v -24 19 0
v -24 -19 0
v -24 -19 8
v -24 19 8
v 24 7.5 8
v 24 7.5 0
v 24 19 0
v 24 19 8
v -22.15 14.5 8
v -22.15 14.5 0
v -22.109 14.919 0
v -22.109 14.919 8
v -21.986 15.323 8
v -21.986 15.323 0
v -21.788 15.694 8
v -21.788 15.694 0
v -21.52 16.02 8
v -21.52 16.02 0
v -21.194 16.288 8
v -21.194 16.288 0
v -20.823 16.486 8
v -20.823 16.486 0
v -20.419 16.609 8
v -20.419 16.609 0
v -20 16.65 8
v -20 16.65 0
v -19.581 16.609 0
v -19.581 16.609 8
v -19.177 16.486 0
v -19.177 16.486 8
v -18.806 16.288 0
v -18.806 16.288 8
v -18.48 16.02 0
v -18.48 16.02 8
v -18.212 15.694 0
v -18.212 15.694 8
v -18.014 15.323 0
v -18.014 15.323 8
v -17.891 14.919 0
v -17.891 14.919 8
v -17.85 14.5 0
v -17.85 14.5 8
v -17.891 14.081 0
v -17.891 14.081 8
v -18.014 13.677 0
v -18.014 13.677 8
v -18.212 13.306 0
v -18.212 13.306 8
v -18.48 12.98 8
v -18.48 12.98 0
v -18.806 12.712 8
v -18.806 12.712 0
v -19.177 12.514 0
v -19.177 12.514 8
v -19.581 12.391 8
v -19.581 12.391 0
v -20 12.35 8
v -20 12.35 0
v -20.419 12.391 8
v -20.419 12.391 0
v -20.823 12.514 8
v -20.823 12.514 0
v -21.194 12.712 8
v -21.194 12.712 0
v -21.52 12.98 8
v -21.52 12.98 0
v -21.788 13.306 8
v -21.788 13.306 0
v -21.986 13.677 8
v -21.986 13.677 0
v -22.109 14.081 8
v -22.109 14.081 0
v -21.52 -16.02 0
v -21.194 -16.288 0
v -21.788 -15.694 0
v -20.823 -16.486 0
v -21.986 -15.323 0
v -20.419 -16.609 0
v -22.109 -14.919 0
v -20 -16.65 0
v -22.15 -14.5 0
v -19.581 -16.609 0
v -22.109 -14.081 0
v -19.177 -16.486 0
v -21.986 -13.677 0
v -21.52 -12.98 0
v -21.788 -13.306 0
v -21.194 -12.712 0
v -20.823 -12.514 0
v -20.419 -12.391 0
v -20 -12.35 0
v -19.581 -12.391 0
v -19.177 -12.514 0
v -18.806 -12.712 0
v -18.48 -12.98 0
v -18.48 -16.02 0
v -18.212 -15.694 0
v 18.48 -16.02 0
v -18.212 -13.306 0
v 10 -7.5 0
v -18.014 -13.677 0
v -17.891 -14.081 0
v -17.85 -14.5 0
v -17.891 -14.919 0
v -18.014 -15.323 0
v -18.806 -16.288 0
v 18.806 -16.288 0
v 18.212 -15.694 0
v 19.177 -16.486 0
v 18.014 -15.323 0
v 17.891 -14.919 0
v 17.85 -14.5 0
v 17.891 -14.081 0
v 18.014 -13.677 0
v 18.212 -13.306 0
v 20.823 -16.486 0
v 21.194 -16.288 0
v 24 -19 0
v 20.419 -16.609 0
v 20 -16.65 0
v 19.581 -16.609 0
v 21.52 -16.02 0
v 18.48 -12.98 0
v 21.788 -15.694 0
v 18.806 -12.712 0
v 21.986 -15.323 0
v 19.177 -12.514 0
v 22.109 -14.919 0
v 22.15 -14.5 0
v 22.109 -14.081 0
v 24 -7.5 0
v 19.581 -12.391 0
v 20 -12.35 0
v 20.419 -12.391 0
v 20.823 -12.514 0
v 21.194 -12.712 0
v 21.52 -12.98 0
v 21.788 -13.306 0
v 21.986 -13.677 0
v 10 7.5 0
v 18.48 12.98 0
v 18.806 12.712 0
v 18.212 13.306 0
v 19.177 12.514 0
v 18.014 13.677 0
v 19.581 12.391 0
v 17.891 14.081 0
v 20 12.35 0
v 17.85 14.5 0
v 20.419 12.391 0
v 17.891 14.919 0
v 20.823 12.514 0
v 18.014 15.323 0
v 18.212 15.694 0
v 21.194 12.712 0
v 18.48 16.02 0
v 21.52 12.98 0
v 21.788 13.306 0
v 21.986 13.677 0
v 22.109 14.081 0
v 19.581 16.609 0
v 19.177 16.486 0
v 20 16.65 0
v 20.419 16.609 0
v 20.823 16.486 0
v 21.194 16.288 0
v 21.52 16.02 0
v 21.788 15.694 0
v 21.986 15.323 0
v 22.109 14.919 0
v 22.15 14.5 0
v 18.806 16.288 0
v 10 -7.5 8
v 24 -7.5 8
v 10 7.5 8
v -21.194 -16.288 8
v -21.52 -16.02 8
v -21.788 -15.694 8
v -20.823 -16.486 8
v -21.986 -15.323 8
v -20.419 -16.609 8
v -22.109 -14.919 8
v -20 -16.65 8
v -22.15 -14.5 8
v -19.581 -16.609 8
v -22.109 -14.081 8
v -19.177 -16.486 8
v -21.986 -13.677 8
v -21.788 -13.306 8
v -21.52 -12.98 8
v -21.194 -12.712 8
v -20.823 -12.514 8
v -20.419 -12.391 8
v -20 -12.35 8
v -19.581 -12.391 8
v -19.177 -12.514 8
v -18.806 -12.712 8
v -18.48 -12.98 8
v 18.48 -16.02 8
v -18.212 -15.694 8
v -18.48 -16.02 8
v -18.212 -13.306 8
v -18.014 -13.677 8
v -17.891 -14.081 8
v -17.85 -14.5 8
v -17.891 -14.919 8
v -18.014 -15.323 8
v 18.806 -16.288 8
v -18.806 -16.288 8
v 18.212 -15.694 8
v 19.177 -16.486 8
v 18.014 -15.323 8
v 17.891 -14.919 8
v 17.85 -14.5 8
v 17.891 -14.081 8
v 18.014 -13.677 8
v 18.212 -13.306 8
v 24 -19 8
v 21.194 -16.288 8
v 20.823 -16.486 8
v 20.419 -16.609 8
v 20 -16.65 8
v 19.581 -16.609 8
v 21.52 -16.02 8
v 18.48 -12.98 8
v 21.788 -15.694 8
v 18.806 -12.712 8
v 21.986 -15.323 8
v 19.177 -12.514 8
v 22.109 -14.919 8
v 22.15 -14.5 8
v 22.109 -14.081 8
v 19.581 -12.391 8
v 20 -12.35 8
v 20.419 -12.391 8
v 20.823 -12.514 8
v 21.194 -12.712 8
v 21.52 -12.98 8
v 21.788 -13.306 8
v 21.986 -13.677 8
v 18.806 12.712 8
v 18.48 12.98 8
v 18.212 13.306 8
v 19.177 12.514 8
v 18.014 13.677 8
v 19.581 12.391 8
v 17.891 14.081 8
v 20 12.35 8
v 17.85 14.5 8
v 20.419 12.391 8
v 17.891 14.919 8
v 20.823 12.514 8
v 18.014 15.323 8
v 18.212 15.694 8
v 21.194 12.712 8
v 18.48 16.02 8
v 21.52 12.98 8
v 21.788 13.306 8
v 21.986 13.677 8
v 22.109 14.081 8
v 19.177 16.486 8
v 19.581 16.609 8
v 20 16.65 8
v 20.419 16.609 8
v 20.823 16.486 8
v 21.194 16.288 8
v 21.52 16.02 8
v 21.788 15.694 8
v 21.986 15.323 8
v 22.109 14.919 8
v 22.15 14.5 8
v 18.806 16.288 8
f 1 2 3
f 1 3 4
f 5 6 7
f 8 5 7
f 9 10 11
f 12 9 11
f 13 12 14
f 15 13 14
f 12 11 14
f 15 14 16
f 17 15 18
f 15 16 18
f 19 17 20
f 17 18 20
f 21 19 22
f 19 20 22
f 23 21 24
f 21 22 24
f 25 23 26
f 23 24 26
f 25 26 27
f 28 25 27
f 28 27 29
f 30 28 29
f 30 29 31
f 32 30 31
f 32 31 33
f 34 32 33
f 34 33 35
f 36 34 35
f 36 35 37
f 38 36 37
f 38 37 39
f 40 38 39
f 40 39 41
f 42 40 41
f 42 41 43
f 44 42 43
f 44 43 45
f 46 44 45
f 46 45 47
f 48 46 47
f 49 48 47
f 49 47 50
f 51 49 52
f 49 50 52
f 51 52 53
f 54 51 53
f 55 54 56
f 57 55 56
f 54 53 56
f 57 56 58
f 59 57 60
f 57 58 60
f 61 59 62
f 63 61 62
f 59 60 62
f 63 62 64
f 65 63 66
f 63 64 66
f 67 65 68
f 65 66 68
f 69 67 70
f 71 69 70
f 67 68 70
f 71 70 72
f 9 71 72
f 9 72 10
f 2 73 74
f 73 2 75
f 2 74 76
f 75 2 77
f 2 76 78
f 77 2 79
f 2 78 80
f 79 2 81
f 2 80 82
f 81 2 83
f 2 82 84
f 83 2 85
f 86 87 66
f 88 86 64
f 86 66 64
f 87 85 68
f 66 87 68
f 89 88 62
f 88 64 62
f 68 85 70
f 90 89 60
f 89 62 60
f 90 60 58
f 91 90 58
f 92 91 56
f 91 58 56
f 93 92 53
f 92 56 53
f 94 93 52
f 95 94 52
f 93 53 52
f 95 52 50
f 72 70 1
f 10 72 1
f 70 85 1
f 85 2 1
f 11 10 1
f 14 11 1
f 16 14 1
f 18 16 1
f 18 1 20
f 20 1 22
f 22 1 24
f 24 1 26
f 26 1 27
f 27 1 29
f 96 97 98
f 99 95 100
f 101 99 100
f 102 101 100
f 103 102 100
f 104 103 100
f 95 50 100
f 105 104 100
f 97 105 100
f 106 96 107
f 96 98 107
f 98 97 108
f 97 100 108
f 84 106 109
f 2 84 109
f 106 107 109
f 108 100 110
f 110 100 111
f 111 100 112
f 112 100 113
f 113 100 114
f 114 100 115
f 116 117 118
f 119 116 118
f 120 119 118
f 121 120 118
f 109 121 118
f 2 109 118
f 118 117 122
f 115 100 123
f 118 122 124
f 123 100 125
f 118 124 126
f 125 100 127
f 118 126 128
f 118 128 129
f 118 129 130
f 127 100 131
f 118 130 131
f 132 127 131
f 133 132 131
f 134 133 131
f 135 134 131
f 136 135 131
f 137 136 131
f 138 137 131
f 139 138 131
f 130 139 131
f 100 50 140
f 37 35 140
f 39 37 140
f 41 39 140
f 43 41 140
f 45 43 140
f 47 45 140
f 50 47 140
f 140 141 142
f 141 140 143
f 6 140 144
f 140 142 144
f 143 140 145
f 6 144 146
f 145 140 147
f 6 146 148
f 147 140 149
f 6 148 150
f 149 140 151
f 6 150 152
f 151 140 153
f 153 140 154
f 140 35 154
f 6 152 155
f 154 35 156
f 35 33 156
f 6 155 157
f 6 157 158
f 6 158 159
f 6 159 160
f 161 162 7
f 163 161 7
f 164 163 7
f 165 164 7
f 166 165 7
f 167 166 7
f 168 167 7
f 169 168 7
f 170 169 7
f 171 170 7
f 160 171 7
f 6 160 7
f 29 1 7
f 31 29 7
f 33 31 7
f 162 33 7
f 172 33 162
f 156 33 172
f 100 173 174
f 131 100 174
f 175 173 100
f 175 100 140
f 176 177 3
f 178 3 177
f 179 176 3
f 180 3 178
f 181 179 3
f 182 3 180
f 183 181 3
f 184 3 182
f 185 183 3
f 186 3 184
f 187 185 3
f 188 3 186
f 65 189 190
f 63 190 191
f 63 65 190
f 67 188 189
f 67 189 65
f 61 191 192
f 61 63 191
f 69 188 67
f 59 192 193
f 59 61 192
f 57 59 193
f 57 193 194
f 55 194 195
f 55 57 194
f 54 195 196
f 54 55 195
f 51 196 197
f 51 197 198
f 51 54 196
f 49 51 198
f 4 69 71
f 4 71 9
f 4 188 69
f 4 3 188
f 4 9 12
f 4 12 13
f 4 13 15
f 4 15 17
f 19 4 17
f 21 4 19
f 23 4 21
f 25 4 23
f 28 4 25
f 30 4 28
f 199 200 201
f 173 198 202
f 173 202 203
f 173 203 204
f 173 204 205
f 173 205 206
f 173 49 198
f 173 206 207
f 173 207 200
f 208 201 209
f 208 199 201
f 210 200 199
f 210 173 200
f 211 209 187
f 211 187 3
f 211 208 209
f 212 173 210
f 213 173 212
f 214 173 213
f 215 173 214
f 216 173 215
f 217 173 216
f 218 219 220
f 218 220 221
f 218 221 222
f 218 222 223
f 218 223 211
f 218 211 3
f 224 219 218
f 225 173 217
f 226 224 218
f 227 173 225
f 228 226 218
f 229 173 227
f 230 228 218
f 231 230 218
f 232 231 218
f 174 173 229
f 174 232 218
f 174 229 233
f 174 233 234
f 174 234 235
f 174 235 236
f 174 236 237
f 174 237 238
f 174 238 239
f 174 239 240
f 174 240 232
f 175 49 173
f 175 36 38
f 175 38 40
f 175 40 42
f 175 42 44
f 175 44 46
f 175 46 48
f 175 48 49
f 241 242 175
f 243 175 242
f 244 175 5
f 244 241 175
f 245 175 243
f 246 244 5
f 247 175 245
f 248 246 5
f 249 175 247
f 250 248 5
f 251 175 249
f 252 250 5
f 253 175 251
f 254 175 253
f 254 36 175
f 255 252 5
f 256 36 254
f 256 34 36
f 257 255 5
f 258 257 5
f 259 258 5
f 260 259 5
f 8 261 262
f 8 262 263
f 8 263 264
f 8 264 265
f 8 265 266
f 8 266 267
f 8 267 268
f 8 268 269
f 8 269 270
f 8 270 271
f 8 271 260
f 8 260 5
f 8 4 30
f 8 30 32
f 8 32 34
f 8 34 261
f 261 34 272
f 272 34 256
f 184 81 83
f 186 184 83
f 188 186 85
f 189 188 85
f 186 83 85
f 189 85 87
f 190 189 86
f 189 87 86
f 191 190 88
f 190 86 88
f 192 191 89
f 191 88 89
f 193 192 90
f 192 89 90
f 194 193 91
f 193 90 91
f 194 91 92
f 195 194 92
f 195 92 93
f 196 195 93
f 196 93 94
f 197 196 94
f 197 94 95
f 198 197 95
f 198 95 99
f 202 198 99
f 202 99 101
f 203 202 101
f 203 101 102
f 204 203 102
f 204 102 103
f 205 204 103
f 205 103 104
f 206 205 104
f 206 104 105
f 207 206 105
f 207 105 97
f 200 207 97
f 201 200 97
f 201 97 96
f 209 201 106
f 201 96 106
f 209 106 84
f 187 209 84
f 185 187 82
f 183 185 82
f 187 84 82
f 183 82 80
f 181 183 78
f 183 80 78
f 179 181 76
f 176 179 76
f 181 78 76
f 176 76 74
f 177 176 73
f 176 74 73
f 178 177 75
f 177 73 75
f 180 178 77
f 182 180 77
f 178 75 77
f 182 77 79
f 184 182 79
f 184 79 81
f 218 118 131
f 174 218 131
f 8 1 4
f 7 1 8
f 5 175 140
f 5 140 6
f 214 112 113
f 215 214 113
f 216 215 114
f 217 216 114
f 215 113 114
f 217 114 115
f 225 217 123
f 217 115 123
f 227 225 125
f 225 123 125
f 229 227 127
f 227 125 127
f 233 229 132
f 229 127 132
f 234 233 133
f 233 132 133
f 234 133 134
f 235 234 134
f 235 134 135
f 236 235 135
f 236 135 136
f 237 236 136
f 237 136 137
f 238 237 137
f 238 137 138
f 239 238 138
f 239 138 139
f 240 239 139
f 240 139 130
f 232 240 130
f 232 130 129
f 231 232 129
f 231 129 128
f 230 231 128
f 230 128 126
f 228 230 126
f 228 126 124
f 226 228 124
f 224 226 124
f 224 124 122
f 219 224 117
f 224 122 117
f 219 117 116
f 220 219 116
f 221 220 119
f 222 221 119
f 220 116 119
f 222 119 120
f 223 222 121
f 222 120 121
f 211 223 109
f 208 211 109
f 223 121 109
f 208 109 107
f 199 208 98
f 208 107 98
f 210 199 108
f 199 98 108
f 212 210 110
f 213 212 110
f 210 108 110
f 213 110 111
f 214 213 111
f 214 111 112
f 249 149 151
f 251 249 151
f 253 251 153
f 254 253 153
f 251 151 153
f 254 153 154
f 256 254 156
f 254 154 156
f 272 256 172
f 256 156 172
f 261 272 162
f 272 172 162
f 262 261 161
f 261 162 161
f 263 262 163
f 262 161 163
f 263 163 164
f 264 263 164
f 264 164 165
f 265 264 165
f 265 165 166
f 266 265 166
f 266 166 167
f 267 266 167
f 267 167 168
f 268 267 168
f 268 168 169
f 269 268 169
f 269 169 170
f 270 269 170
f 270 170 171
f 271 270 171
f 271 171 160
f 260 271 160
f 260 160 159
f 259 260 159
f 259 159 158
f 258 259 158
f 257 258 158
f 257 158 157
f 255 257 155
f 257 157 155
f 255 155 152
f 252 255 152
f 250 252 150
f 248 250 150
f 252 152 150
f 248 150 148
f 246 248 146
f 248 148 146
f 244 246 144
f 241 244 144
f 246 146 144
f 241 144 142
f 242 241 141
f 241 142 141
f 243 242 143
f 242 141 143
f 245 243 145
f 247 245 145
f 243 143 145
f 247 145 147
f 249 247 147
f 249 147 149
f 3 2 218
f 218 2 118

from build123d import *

# Parameters (mm, degrees)
ESQUISSE1_W             = 48
ESQUISSE1_H             = 38
BOSS_EXTRU_1_DEPTH      = 8
ESQUISSE4_W             = 14
ESQUISSE4_H             = 15
ENL_V_MAT_EXTRU_2_DEPTH = 8
D_GAGEMENT_M41_D        = 4.3
D_GAGEMENT_M41_DEPTH    = 10
D_GAGEMENT_M41_TIP      = 1.291850331


with BuildPart() as part:
    # Esquisse1 → Boss.-Extru.1 (new body)
    with BuildSketch(Plane.XY):
        Rectangle(ESQUISSE1_W, ESQUISSE1_H)
    extrude(amount=BOSS_EXTRU_1_DEPTH)

    # Esquisse4 → Enlèv. mat.-Extru.2 (cut)
    with BuildSketch(Plane.XY.offset(8)):
        with Locations((17, 0)):
            Rectangle(ESQUISSE4_W, ESQUISSE4_H)
    extrude(amount=-ENL_V_MAT_EXTRU_2_DEPTH, mode=Mode.SUBTRACT)

    # Dégagement M41
    with Locations(Plane(origin=(-20, 14.5, 8), x_dir=(1, 0, 0), z_dir=(0, 0, 1))):
        with Locations((0, 0), (40, 0), (0, -29), (40, -29)):
            Hole(D_GAGEMENT_M41_D / 2, depth=D_GAGEMENT_M41_DEPTH)
            with Locations((0, 0, -(D_GAGEMENT_M41_DEPTH + D_GAGEMENT_M41_TIP / 2))):  # 118° drill point
                Cone(0, D_GAGEMENT_M41_D / 2, D_GAGEMENT_M41_TIP, mode=Mode.SUBTRACT)


solid = part.part
